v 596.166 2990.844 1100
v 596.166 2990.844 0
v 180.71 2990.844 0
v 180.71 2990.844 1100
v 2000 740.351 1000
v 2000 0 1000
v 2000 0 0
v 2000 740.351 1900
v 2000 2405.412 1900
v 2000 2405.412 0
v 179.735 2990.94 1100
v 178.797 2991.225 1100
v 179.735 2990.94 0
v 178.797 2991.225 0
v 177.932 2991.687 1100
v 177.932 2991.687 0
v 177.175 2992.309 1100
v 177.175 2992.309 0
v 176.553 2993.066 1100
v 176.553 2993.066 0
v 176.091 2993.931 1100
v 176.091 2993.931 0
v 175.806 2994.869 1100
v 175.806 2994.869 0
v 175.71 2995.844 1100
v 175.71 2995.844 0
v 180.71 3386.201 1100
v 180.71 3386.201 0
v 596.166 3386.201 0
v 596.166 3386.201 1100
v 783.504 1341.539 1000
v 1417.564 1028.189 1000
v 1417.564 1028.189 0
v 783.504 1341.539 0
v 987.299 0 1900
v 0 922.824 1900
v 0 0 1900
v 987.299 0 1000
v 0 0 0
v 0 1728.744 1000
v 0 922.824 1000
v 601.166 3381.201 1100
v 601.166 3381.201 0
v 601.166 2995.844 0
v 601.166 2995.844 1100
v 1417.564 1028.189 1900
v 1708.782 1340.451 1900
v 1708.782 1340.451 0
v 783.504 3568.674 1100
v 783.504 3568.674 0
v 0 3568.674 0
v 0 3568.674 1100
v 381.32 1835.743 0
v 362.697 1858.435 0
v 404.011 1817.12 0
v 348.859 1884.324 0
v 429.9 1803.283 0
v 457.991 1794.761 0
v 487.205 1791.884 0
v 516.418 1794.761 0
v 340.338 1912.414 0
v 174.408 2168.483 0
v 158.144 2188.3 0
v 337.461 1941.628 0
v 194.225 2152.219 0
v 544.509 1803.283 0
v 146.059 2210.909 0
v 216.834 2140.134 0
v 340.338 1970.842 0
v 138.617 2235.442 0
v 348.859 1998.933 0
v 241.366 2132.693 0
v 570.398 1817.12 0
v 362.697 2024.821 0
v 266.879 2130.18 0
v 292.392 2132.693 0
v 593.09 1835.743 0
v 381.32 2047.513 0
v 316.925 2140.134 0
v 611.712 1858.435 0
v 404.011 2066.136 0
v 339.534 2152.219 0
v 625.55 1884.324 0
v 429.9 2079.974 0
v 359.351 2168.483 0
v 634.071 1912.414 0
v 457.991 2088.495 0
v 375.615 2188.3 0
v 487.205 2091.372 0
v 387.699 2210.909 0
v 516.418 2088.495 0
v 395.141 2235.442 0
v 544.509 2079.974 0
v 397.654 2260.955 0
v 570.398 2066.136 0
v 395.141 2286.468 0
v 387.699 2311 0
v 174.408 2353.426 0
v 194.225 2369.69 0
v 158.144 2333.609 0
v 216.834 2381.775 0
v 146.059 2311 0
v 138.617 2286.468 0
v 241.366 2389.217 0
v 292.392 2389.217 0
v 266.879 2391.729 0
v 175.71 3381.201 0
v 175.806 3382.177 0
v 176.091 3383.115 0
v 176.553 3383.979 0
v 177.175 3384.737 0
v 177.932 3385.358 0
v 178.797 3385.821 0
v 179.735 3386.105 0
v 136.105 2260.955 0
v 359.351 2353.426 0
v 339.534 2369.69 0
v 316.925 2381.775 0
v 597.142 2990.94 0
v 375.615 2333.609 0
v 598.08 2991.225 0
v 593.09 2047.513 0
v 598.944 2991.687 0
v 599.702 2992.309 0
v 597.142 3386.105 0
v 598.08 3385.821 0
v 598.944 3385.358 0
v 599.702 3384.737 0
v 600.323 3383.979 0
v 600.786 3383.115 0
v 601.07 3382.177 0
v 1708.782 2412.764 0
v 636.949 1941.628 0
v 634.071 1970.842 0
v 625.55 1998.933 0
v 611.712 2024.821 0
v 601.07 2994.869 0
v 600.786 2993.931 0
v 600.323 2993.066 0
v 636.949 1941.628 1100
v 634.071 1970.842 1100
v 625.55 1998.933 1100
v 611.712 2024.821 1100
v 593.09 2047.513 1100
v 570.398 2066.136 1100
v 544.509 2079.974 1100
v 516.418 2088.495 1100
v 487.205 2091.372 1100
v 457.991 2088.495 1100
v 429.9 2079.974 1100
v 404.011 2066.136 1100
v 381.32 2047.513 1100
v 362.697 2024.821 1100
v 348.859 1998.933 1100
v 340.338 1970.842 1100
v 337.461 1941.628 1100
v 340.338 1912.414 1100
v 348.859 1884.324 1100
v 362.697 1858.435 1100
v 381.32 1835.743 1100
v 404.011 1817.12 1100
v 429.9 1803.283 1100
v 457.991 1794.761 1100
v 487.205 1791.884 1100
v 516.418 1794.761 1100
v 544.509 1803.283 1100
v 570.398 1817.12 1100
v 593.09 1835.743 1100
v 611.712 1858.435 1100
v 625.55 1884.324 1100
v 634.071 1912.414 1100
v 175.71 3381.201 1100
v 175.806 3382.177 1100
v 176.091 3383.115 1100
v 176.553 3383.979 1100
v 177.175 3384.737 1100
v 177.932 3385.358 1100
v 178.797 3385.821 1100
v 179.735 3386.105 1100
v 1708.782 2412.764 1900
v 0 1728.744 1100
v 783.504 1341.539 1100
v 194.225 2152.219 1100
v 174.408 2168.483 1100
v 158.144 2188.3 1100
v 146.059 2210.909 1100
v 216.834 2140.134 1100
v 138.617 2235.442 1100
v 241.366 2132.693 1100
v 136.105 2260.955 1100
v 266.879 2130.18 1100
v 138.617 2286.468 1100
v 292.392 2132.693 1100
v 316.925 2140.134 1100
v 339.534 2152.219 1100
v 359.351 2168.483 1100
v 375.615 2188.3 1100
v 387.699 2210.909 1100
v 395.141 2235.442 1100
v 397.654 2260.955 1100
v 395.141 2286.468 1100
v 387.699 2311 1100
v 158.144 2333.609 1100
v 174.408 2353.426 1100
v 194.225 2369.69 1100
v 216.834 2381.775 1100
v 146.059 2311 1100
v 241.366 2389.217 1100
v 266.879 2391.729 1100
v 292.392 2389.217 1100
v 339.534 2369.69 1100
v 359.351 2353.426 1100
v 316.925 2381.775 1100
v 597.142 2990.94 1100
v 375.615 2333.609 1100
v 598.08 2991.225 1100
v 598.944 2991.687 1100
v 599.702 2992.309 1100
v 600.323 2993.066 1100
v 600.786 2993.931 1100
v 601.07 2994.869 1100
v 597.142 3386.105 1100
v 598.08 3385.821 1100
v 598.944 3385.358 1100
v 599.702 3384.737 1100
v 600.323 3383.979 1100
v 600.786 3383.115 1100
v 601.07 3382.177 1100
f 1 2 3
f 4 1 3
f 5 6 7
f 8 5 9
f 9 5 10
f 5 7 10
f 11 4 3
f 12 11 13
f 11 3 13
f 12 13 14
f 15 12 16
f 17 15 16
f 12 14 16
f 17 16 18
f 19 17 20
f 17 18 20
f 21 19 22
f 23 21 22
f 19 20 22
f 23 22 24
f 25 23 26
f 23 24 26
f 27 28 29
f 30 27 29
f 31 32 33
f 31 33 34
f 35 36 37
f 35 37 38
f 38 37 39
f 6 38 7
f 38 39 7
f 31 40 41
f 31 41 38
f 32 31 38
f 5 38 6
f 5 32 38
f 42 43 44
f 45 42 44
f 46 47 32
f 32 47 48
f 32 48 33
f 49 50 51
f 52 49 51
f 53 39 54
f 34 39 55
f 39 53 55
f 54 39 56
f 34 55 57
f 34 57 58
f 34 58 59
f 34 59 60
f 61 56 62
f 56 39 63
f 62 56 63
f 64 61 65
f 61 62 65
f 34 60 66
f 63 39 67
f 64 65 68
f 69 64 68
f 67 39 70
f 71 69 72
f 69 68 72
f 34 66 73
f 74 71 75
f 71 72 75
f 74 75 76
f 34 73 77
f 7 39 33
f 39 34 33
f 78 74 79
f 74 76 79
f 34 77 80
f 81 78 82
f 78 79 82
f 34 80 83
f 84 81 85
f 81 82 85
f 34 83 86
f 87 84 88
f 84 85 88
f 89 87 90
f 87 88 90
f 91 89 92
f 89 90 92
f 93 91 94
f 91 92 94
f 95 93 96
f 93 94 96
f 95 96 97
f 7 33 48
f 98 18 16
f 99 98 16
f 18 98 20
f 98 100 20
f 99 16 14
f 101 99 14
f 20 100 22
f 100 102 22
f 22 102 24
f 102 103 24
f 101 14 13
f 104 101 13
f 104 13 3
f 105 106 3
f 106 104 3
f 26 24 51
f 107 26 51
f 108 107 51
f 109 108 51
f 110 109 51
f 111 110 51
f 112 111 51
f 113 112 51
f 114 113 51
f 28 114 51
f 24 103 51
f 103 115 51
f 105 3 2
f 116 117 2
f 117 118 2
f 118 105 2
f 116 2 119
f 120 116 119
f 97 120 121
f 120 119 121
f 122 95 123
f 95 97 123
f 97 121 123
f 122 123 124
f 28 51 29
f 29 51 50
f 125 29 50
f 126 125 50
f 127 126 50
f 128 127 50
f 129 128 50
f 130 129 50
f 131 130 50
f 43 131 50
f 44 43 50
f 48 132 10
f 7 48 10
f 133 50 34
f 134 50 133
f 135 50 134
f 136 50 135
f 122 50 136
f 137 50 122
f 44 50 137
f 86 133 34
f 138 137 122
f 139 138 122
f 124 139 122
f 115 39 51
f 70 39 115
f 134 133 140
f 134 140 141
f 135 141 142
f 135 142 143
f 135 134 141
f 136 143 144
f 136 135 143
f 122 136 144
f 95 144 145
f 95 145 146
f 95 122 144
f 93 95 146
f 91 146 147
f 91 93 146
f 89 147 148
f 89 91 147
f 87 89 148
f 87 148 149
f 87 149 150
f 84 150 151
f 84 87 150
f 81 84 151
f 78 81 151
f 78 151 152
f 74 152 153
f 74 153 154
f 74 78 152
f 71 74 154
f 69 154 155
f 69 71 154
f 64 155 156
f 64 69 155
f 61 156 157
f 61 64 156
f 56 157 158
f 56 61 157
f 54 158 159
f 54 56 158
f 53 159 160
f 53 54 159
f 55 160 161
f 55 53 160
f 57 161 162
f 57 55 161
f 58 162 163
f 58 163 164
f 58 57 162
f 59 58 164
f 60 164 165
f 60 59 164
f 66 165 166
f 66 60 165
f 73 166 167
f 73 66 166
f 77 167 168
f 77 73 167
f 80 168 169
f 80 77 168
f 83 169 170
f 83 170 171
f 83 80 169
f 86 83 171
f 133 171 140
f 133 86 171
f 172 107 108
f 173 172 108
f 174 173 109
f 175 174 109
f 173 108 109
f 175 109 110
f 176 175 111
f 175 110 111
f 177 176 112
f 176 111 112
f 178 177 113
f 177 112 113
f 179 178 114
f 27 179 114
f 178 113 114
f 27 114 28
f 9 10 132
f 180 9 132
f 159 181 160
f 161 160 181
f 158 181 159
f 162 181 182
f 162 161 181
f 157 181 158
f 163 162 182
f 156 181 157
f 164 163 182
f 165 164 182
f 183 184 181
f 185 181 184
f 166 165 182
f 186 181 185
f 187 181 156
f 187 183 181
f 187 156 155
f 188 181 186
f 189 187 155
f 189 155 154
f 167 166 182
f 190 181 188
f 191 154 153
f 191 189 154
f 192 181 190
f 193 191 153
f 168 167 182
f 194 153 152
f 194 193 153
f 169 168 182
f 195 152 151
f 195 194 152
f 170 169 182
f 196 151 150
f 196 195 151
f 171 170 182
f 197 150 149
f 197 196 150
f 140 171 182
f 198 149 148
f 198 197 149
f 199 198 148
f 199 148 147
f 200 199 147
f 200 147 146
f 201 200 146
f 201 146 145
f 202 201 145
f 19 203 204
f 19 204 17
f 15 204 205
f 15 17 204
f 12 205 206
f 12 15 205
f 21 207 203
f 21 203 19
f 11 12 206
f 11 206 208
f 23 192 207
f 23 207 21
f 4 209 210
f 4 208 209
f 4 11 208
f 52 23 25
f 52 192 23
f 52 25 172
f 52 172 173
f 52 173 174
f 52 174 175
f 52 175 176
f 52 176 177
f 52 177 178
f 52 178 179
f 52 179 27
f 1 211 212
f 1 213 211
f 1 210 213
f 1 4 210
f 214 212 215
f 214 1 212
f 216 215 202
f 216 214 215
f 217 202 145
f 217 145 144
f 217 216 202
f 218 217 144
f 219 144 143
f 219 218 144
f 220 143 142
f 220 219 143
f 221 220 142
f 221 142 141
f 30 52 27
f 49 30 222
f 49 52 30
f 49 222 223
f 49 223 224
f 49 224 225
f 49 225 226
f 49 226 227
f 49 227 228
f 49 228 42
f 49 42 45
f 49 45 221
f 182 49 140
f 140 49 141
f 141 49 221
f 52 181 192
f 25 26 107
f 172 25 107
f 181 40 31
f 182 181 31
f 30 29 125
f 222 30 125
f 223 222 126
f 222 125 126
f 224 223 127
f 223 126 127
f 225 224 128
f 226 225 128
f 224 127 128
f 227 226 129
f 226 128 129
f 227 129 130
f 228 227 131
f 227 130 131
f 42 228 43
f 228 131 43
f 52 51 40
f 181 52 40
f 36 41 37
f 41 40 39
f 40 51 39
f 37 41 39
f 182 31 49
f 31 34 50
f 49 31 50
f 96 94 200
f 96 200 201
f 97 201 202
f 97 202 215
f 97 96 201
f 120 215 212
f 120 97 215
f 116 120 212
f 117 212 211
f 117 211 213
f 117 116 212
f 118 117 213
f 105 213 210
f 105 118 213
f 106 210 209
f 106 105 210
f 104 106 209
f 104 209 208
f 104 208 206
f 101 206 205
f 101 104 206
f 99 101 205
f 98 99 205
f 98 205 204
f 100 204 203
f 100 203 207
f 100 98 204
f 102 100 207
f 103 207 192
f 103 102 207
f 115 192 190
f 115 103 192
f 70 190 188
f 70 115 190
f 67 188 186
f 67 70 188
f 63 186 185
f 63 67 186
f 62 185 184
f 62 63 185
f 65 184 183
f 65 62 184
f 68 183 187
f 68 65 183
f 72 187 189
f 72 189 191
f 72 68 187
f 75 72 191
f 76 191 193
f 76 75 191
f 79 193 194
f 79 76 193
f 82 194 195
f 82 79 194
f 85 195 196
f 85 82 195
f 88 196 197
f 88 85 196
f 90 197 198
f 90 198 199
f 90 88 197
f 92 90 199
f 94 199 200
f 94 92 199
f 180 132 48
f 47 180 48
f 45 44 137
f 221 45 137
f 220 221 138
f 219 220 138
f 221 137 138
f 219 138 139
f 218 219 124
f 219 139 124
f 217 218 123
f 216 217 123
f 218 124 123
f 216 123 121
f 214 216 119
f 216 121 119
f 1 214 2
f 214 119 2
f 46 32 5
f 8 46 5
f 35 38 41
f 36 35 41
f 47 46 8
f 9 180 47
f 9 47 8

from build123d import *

# Parameters (mm, degrees)
F1_DEPTH = 1900
F2_DEPTH = 1000
F0_R     = 149.7440196074
F0_R_2   = 130.7747559493
F3_DEPTH = 1100
F4_DEPTH = 1900
F5_DEPTH = 1900


with BuildPart() as f1:
    # F0 (on Top) → F1 (new body)
    with BuildSketch(Plane.XY):
        Polygon((0, 0), (987.2985183434, 0), (0, 922.8238463402), align=None)
    extrude(amount=F1_DEPTH)

    # F0 (on Top) → F2 (join)
    with BuildSketch(Plane.XY):
        Polygon((987.2985183434, 0), (2000, 0), (2000, 740.351498127), (1417.5641597736, 1028.1890113665), (783.5044264793, 1341.5388505621), (0, 1728.7436723709), (0, 1728.7435531616), (0, 922.8238463402), align=None)
    extrude(amount=F2_DEPTH)

    # F0 (on Top) → F3 (join)
    with BuildSketch(Plane.XY):
        Polygon((0, 1728.7436723709), (783.5044264793, 1341.5388505621), (783.5044264793, 1728.7435531616), (783.5044264793, 3568.6736106873), (0, 3568.6736106873), align=None)
        with Locations((487.2047007084, 1941.6280984879)):
            Circle(F0_R, mode=Mode.SUBTRACT)
        with Locations((266.8792903423, 2260.954618454)):
            Circle(F0_R_2, mode=Mode.SUBTRACT)
        with BuildLine():
            ThreePointArc((175.7101416588, 3381.2011432648), (177.1746077529, 3384.7366771707), (180.7101416588, 3386.2011432648))
            Line((180.7101416588, 3386.2011432648), (596.1661291122, 3386.2011432648))
            ThreePointArc((596.1661291122, 3386.2011432648), (599.7016630182, 3384.7366771707), (601.1661291122, 3381.2011432648))
            Line((601.1661291122, 3381.2011432648), (601.1661291122, 2995.8442497253))
            ThreePointArc((601.1661291122, 2995.8442497253), (599.7016630182, 2992.3087158194), (596.1661291122, 2990.8442497253))
            Line((596.1661291122, 2990.8442497253), (180.7101416588, 2990.8442497253))
            ThreePointArc((180.7101416588, 2990.8442497253), (177.1746077529, 2992.3087158194), (175.7101416588, 2995.8442497253))
            Line((175.7101416588, 2995.8442497253), (175.7101416588, 3381.2011432648))
        make_face(mode=Mode.SUBTRACT)
    extrude(amount=F3_DEPTH)

    # F0 (on Top) → F4 (join)
    with BuildSketch(Plane.XY):
        Polygon((1417.5641597736, 1028.1890113665), (2000, 740.351498127), (2000, 1652.7134180069), (1708.7820798868, 1340.4512146867), align=None)
    extrude(amount=F4_DEPTH)

    # F0 (on Top) → F5 (join)
    with BuildSketch(Plane.XY):
        Polygon((1708.7820798868, 1340.4512146867), (2000, 1652.7134180069), (2000, 2405.412197113), (1708.7820798868, 2412.763577853), align=None)
    extrude(amount=F5_DEPTH)


solid = f1.part
